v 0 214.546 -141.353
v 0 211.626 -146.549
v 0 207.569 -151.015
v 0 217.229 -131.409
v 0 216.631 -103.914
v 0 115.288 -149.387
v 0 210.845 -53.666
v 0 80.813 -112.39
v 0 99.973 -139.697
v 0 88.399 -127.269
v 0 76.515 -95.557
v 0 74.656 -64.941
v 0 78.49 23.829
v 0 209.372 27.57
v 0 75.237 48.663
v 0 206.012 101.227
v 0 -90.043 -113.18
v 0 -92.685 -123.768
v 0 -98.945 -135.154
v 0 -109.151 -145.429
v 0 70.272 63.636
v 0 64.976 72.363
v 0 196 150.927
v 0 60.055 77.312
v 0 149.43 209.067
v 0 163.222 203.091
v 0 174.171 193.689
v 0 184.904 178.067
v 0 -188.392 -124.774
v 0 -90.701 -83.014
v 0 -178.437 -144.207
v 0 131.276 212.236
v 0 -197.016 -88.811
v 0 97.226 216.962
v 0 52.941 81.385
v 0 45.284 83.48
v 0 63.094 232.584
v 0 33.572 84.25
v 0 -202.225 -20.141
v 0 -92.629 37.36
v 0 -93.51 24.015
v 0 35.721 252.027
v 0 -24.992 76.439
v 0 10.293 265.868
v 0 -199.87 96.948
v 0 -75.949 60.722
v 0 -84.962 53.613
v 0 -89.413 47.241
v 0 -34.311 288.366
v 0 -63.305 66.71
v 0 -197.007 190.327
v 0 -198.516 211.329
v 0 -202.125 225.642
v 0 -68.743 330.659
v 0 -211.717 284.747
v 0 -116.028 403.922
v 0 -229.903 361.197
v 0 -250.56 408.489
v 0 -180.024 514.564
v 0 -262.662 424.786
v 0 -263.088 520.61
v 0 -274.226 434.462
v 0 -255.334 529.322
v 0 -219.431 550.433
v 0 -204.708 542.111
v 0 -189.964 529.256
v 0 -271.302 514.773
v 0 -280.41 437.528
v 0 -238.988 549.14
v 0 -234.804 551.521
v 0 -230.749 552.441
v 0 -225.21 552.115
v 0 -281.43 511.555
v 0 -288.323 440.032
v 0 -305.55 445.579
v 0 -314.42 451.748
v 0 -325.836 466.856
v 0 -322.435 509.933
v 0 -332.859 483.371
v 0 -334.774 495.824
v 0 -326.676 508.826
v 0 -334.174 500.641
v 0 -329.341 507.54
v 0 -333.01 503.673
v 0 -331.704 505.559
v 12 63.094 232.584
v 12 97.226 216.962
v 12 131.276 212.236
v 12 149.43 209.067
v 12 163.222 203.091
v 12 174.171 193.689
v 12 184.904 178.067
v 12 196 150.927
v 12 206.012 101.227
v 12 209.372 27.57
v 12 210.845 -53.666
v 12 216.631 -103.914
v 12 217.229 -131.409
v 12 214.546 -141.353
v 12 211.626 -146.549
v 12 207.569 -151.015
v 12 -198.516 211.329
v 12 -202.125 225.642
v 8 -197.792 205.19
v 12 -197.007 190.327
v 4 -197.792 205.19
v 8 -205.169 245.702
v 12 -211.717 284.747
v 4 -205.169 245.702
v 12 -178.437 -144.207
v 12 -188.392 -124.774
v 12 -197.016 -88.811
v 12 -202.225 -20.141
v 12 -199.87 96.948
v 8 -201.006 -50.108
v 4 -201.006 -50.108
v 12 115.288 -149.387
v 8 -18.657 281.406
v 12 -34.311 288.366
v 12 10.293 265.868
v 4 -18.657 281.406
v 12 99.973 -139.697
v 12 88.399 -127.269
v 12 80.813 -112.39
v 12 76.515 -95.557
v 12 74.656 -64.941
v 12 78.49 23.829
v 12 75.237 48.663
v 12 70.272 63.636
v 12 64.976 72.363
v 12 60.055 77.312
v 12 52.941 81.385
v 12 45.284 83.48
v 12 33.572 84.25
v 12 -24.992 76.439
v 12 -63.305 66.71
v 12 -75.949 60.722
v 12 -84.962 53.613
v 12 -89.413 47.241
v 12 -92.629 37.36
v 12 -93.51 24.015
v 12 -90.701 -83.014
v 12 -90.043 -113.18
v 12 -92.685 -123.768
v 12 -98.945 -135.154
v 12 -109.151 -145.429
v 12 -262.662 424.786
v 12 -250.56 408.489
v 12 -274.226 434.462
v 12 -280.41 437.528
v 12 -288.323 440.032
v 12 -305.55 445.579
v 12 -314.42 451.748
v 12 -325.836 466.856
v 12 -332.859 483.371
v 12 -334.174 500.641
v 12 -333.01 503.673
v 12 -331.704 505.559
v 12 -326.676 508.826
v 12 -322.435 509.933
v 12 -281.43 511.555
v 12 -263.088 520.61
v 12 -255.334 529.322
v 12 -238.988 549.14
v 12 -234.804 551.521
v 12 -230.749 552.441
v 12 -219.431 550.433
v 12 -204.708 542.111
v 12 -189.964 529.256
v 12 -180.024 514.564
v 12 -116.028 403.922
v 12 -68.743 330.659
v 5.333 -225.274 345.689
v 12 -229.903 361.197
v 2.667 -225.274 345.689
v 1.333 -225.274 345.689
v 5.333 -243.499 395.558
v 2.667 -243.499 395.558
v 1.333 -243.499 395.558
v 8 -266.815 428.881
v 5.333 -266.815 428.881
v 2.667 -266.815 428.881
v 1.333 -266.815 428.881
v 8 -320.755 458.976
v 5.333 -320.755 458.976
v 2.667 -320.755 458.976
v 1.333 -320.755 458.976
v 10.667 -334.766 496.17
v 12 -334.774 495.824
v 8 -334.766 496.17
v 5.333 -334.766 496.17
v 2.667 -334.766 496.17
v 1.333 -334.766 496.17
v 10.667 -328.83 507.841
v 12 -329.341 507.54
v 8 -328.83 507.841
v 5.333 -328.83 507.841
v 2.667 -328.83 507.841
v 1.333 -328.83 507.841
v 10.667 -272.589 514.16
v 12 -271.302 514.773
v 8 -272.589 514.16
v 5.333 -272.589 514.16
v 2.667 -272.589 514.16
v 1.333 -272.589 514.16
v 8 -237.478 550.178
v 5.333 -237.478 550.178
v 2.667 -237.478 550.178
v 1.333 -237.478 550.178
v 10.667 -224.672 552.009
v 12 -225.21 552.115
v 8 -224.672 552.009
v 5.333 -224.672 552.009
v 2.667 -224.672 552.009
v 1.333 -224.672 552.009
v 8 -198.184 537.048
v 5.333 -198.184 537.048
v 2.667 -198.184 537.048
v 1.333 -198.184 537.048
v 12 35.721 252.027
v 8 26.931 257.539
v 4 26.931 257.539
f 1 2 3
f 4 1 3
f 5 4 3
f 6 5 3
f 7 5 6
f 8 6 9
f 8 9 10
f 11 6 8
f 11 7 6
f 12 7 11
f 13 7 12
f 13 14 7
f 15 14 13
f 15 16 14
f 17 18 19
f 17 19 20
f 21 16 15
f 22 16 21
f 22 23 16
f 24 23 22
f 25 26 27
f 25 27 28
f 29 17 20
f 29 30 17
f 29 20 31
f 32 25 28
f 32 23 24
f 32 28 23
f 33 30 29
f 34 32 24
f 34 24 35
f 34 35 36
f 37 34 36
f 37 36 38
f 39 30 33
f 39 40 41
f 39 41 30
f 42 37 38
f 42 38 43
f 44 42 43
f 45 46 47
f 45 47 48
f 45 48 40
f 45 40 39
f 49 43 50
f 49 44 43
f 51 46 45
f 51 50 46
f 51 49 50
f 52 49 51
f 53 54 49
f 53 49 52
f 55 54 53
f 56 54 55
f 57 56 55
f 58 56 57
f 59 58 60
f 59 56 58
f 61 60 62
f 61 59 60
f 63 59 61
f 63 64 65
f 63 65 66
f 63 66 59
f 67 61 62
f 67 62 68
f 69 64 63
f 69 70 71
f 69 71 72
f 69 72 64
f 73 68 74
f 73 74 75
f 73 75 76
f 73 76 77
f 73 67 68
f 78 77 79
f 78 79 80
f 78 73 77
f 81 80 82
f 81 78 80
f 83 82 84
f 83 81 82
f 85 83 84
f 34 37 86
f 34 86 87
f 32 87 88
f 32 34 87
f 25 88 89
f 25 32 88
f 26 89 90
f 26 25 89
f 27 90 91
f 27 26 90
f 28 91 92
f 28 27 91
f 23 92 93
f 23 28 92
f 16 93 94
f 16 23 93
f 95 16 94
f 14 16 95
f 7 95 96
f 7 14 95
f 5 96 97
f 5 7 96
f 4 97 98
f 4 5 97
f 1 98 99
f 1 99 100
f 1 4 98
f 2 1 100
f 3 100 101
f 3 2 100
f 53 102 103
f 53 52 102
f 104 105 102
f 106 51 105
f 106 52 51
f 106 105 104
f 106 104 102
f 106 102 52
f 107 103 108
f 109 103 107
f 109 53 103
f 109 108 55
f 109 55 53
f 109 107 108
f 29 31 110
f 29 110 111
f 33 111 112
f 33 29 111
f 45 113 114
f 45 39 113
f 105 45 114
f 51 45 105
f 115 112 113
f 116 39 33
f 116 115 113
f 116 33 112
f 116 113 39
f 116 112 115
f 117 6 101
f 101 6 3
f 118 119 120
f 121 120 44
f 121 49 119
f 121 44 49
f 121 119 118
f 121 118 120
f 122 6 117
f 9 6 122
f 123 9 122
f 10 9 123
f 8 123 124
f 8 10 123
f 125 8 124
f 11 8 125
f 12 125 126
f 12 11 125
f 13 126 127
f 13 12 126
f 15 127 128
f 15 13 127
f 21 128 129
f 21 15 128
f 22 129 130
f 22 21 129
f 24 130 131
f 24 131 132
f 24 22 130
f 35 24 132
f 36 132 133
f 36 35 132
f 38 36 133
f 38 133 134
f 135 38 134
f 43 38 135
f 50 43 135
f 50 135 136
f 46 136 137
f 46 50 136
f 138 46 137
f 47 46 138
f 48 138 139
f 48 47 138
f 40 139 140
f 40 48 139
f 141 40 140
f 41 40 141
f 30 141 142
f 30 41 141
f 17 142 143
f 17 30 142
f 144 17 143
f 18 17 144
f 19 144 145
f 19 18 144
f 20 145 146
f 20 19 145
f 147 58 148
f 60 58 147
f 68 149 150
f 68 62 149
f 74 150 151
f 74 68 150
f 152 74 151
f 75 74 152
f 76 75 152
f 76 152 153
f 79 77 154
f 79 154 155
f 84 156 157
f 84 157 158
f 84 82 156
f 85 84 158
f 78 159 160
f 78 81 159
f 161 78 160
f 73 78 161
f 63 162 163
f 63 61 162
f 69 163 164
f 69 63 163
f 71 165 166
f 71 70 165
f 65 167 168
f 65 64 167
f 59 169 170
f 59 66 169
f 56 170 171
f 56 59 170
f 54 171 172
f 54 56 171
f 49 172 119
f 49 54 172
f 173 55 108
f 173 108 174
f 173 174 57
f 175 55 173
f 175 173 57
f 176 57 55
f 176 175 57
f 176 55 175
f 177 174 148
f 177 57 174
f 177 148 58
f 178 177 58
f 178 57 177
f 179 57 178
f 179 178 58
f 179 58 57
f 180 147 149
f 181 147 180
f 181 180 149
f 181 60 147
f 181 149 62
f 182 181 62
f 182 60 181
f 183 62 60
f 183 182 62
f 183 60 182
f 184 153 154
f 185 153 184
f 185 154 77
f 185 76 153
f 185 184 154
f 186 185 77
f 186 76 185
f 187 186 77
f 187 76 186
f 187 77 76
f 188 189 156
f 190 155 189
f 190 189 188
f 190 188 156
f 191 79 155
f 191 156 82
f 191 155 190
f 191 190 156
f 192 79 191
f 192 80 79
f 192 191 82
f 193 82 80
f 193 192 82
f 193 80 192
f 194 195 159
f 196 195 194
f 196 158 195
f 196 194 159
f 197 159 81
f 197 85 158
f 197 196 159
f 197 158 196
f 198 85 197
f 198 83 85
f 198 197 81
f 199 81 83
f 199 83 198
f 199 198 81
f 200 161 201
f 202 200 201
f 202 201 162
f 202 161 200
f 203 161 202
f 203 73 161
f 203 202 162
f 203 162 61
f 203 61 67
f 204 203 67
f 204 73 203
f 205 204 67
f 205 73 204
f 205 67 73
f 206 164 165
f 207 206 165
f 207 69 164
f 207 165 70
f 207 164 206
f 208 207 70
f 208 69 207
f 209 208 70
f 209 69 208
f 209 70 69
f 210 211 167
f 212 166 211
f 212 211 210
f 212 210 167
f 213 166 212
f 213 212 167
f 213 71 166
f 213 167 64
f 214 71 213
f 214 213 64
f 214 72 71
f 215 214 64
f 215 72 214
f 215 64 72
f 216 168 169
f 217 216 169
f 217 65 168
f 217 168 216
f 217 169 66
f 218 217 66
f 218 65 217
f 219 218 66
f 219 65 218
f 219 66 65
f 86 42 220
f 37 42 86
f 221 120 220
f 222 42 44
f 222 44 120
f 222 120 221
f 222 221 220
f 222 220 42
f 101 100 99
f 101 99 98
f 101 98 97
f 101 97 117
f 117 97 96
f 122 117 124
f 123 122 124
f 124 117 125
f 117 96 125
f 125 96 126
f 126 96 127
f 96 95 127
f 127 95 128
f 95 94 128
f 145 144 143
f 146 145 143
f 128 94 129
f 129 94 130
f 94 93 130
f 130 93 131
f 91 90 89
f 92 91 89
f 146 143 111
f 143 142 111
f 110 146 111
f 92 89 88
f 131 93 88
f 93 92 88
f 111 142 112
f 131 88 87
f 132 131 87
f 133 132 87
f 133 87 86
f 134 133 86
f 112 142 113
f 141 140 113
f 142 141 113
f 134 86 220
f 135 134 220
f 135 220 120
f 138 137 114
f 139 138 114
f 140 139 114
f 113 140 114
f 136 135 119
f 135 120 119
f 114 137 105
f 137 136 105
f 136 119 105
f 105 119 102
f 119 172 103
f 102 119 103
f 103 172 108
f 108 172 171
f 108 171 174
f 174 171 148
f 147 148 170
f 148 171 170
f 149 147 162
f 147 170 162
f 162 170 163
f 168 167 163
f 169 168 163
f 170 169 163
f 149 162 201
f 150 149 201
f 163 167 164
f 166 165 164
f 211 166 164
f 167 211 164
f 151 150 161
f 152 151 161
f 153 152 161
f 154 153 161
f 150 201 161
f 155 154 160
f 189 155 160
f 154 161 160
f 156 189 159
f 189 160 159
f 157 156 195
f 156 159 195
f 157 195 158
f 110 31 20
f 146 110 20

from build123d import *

# Parameters (mm, degrees)
F1_DEPTH = 12


with BuildPart() as f1:
    # F0 (on Right) → F1 (new body)
    with BuildSketch(Plane.YZ):
        with BuildLine():
            add(Edge.make_bspline(
                [(-178.4369833225, -144.2066091912), (-219.218467925, -89.3323742164), (-195.3415795005, 113.7315380775), (-197.007060051, 190.3274804354)],
                knots=[0.0031505946, 0.0031505946, 0.0031505946, 0.0031505946, 0.0998386573, 0.0998386573, 0.0998386573, 0.0998386573], degree=3))
            Line((-178.4369833225, -144.2066091912), (-109.1511381578, -145.4286668255))
            add(Edge.make_bspline(
                [(115.2884357666, -149.3873122617), (107.1403709504, -145.3507189429), (62.2417659614, -114.3804366066), (86.2834183467, -3.0492512147), (70.8695963558, 91.374454728), (0.4418432139, 80.4667572796), (-101.9293868506, 65.0970756202), (-88.6503884924, -2.5844560488), (-96.59431316, -67.481945255), (-83.1150537691, -119.8184104695), (-104.8879154969, -142.055068639), (-109.1511381578, -145.4286668255)],
                knots=[0.6073825493, 0.6073825493, 0.6073825493, 0.6073825493, 0.6195734428, 0.6825204089, 0.7308072739, 0.7727612584, 0.824213165, 0.8635812279, 0.9083971983, 0.9523997564, 0.9613925241, 0.9613925241, 0.9613925241, 0.9613925241], degree=3))
            Line((115.2884357666, -149.3873122617), (207.5685221579, -151.0149402974))
            add(Edge.make_bspline(
                [(63.0940198898, 232.5838804245), (82.5887469223, 220.8525880353), (109.669328549, 211.0698213252), (178.2811116459, 213.9353754027), (217.1880000792, 96.1874140131), (202.5402479992, -58.3272921235), (224.9464188994, -135.8202031967), (207.5685221579, -151.0149402974)],
                knots=[0.3062619929, 0.3062619929, 0.3062619929, 0.3062619929, 0.3456878235, 0.3855453305, 0.441597856, 0.5123533056, 0.5605055591, 0.5605055591, 0.5605055591, 0.5605055591], degree=3))
            add(Edge.make_bspline(
                [(10.2934252514, 265.8684253693), (30.8960203842, 253.7377434197), (48.6497019648, 241.2760009482), (63.0940198898, 232.5838804245)],
                knots=[0.2770500306, 0.2770500306, 0.2770500306, 0.2770500306, 0.3062619929, 0.3062619929, 0.3062619929, 0.3062619929], degree=3))
            add(Edge.make_bspline(
                [(-34.3105899744, 288.3658303985), (-16.0059367898, 270.857218406), (-3.9004302042, 271.3447660229), (10.2934252515, 265.8684253693)],
                knots=[0.8420372945, 0.8420372945, 0.8420372945, 0.8420372945, 0.9166264892, 0.9166264892, 0.9166264892, 0.9166264892], degree=3))
            add(Edge.make_bspline(
                [(-211.7170714071, 284.7467597814), (-184.5213159088, 297.7083735615), (-113.0964050862, 313.28698488), (-53.1463731801, 296.0697503513), (-34.3105899743, 288.3658303985)],
                knots=[0.1907363518, 0.1907363518, 0.1907363518, 0.1907363518, 0.2349239596, 0.2576813871, 0.2576813871, 0.2576813871, 0.2576813871], degree=3))
            add(Edge.make_bspline(
                [(-202.1251185427, 225.6420666888), (-205.1173154703, 245.8230559311), (-208.2397581251, 265.699564879), (-211.7170714094, 284.7467597816)],
                knots=[0.0252319415, 0.0252319415, 0.0252319415, 0.0252319415, 0.0687416948, 0.0687416948, 0.0687416948, 0.0687416948], degree=3))
            add(Edge.make_bspline(
                [(-197.007060051, 190.3274804354), (-197.3715451624, 207.0902583485), (-198.959354649, 217.7959884423), (-202.1251185427, 225.6420666888)],
                knots=[0.0998386573, 0.0998386573, 0.0998386573, 0.0998386573, 0.1209985317, 0.1209985317, 0.1209985317, 0.1209985317], degree=3))
        make_face()
        with BuildLine():
            add(Edge.make_bspline(
                [(-211.7170714094, 284.7467597816), (-217.7643571513, 317.8711350511), (-233.501733701, 385.5372165029), (-270.9766028708, 444.2774273237), (-317.8093852203, 438.6517263777), (-353.310824472, 526.2917032161), (-262.014970167, 495.7742045555), (-241.4702158375, 568.9109908599), (-191.1466514789, 533.2833458738), (-177.7335883136, 511.8222232655), (-76.1302337971, 328.3668022809), (-34.3105899744, 288.3658303985)],
                knots=[0.0687416948, 0.0687416948, 0.0687416948, 0.0687416948, 0.144408133, 0.2359749256, 0.3030161757, 0.3825395321, 0.4642263003, 0.5415325093, 0.6086189201, 0.6716274253, 0.8420372945, 0.8420372945, 0.8420372945, 0.8420372945], degree=3))
            add(Edge.make_bspline(
                [(-211.7170714071, 284.7467597814), (-184.5213159088, 297.7083735615), (-113.0964050862, 313.28698488), (-53.1463731801, 296.0697503513), (-34.3105899743, 288.3658303985)],
                knots=[0.1907363518, 0.1907363518, 0.1907363518, 0.1907363518, 0.2349239596, 0.2576813871, 0.2576813871, 0.2576813871, 0.2576813871], degree=3))
        make_face()
        with BuildLine():
            add(Edge.make_bspline(
                [(10.2934252514, 265.8684253693), (30.8960203842, 253.7377434197), (48.6497019648, 241.2760009482), (63.0940198898, 232.5838804245)],
                knots=[0.2770500306, 0.2770500306, 0.2770500306, 0.2770500306, 0.3062619929, 0.3062619929, 0.3062619929, 0.3062619929], degree=3))
            add(Edge.make_bspline(
                [(10.2934252515, 265.8684253693), (26.1588809193, 259.747139991), (44.6335367378, 246.1745238524), (63.0940198898, 232.5838804245)],
                knots=[0.9166264892, 0.9166264892, 0.9166264892, 0.9166264892, 1, 1, 1, 1], degree=3))
        make_face()
        with BuildLine():
            add(Edge.make_bspline(
                [(-34.3105899743, 288.3658303985), (-18.2796229907, 281.8090928814), (-3.3668798977, 273.9115294555), (10.2934252514, 265.8684253693)],
                knots=[0.2576813871, 0.2576813871, 0.2576813871, 0.2576813871, 0.2770500306, 0.2770500306, 0.2770500306, 0.2770500306], degree=3))
            add(Edge.make_bspline(
                [(-34.3105899744, 288.3658303985), (-16.0059367898, 270.857218406), (-3.9004302042, 271.3447660229), (10.2934252515, 265.8684253693)],
                knots=[0.8420372945, 0.8420372945, 0.8420372945, 0.8420372945, 0.9166264892, 0.9166264892, 0.9166264892, 0.9166264892], degree=3))
        make_face()
    extrude(amount=F1_DEPTH)


solid = f1.part
